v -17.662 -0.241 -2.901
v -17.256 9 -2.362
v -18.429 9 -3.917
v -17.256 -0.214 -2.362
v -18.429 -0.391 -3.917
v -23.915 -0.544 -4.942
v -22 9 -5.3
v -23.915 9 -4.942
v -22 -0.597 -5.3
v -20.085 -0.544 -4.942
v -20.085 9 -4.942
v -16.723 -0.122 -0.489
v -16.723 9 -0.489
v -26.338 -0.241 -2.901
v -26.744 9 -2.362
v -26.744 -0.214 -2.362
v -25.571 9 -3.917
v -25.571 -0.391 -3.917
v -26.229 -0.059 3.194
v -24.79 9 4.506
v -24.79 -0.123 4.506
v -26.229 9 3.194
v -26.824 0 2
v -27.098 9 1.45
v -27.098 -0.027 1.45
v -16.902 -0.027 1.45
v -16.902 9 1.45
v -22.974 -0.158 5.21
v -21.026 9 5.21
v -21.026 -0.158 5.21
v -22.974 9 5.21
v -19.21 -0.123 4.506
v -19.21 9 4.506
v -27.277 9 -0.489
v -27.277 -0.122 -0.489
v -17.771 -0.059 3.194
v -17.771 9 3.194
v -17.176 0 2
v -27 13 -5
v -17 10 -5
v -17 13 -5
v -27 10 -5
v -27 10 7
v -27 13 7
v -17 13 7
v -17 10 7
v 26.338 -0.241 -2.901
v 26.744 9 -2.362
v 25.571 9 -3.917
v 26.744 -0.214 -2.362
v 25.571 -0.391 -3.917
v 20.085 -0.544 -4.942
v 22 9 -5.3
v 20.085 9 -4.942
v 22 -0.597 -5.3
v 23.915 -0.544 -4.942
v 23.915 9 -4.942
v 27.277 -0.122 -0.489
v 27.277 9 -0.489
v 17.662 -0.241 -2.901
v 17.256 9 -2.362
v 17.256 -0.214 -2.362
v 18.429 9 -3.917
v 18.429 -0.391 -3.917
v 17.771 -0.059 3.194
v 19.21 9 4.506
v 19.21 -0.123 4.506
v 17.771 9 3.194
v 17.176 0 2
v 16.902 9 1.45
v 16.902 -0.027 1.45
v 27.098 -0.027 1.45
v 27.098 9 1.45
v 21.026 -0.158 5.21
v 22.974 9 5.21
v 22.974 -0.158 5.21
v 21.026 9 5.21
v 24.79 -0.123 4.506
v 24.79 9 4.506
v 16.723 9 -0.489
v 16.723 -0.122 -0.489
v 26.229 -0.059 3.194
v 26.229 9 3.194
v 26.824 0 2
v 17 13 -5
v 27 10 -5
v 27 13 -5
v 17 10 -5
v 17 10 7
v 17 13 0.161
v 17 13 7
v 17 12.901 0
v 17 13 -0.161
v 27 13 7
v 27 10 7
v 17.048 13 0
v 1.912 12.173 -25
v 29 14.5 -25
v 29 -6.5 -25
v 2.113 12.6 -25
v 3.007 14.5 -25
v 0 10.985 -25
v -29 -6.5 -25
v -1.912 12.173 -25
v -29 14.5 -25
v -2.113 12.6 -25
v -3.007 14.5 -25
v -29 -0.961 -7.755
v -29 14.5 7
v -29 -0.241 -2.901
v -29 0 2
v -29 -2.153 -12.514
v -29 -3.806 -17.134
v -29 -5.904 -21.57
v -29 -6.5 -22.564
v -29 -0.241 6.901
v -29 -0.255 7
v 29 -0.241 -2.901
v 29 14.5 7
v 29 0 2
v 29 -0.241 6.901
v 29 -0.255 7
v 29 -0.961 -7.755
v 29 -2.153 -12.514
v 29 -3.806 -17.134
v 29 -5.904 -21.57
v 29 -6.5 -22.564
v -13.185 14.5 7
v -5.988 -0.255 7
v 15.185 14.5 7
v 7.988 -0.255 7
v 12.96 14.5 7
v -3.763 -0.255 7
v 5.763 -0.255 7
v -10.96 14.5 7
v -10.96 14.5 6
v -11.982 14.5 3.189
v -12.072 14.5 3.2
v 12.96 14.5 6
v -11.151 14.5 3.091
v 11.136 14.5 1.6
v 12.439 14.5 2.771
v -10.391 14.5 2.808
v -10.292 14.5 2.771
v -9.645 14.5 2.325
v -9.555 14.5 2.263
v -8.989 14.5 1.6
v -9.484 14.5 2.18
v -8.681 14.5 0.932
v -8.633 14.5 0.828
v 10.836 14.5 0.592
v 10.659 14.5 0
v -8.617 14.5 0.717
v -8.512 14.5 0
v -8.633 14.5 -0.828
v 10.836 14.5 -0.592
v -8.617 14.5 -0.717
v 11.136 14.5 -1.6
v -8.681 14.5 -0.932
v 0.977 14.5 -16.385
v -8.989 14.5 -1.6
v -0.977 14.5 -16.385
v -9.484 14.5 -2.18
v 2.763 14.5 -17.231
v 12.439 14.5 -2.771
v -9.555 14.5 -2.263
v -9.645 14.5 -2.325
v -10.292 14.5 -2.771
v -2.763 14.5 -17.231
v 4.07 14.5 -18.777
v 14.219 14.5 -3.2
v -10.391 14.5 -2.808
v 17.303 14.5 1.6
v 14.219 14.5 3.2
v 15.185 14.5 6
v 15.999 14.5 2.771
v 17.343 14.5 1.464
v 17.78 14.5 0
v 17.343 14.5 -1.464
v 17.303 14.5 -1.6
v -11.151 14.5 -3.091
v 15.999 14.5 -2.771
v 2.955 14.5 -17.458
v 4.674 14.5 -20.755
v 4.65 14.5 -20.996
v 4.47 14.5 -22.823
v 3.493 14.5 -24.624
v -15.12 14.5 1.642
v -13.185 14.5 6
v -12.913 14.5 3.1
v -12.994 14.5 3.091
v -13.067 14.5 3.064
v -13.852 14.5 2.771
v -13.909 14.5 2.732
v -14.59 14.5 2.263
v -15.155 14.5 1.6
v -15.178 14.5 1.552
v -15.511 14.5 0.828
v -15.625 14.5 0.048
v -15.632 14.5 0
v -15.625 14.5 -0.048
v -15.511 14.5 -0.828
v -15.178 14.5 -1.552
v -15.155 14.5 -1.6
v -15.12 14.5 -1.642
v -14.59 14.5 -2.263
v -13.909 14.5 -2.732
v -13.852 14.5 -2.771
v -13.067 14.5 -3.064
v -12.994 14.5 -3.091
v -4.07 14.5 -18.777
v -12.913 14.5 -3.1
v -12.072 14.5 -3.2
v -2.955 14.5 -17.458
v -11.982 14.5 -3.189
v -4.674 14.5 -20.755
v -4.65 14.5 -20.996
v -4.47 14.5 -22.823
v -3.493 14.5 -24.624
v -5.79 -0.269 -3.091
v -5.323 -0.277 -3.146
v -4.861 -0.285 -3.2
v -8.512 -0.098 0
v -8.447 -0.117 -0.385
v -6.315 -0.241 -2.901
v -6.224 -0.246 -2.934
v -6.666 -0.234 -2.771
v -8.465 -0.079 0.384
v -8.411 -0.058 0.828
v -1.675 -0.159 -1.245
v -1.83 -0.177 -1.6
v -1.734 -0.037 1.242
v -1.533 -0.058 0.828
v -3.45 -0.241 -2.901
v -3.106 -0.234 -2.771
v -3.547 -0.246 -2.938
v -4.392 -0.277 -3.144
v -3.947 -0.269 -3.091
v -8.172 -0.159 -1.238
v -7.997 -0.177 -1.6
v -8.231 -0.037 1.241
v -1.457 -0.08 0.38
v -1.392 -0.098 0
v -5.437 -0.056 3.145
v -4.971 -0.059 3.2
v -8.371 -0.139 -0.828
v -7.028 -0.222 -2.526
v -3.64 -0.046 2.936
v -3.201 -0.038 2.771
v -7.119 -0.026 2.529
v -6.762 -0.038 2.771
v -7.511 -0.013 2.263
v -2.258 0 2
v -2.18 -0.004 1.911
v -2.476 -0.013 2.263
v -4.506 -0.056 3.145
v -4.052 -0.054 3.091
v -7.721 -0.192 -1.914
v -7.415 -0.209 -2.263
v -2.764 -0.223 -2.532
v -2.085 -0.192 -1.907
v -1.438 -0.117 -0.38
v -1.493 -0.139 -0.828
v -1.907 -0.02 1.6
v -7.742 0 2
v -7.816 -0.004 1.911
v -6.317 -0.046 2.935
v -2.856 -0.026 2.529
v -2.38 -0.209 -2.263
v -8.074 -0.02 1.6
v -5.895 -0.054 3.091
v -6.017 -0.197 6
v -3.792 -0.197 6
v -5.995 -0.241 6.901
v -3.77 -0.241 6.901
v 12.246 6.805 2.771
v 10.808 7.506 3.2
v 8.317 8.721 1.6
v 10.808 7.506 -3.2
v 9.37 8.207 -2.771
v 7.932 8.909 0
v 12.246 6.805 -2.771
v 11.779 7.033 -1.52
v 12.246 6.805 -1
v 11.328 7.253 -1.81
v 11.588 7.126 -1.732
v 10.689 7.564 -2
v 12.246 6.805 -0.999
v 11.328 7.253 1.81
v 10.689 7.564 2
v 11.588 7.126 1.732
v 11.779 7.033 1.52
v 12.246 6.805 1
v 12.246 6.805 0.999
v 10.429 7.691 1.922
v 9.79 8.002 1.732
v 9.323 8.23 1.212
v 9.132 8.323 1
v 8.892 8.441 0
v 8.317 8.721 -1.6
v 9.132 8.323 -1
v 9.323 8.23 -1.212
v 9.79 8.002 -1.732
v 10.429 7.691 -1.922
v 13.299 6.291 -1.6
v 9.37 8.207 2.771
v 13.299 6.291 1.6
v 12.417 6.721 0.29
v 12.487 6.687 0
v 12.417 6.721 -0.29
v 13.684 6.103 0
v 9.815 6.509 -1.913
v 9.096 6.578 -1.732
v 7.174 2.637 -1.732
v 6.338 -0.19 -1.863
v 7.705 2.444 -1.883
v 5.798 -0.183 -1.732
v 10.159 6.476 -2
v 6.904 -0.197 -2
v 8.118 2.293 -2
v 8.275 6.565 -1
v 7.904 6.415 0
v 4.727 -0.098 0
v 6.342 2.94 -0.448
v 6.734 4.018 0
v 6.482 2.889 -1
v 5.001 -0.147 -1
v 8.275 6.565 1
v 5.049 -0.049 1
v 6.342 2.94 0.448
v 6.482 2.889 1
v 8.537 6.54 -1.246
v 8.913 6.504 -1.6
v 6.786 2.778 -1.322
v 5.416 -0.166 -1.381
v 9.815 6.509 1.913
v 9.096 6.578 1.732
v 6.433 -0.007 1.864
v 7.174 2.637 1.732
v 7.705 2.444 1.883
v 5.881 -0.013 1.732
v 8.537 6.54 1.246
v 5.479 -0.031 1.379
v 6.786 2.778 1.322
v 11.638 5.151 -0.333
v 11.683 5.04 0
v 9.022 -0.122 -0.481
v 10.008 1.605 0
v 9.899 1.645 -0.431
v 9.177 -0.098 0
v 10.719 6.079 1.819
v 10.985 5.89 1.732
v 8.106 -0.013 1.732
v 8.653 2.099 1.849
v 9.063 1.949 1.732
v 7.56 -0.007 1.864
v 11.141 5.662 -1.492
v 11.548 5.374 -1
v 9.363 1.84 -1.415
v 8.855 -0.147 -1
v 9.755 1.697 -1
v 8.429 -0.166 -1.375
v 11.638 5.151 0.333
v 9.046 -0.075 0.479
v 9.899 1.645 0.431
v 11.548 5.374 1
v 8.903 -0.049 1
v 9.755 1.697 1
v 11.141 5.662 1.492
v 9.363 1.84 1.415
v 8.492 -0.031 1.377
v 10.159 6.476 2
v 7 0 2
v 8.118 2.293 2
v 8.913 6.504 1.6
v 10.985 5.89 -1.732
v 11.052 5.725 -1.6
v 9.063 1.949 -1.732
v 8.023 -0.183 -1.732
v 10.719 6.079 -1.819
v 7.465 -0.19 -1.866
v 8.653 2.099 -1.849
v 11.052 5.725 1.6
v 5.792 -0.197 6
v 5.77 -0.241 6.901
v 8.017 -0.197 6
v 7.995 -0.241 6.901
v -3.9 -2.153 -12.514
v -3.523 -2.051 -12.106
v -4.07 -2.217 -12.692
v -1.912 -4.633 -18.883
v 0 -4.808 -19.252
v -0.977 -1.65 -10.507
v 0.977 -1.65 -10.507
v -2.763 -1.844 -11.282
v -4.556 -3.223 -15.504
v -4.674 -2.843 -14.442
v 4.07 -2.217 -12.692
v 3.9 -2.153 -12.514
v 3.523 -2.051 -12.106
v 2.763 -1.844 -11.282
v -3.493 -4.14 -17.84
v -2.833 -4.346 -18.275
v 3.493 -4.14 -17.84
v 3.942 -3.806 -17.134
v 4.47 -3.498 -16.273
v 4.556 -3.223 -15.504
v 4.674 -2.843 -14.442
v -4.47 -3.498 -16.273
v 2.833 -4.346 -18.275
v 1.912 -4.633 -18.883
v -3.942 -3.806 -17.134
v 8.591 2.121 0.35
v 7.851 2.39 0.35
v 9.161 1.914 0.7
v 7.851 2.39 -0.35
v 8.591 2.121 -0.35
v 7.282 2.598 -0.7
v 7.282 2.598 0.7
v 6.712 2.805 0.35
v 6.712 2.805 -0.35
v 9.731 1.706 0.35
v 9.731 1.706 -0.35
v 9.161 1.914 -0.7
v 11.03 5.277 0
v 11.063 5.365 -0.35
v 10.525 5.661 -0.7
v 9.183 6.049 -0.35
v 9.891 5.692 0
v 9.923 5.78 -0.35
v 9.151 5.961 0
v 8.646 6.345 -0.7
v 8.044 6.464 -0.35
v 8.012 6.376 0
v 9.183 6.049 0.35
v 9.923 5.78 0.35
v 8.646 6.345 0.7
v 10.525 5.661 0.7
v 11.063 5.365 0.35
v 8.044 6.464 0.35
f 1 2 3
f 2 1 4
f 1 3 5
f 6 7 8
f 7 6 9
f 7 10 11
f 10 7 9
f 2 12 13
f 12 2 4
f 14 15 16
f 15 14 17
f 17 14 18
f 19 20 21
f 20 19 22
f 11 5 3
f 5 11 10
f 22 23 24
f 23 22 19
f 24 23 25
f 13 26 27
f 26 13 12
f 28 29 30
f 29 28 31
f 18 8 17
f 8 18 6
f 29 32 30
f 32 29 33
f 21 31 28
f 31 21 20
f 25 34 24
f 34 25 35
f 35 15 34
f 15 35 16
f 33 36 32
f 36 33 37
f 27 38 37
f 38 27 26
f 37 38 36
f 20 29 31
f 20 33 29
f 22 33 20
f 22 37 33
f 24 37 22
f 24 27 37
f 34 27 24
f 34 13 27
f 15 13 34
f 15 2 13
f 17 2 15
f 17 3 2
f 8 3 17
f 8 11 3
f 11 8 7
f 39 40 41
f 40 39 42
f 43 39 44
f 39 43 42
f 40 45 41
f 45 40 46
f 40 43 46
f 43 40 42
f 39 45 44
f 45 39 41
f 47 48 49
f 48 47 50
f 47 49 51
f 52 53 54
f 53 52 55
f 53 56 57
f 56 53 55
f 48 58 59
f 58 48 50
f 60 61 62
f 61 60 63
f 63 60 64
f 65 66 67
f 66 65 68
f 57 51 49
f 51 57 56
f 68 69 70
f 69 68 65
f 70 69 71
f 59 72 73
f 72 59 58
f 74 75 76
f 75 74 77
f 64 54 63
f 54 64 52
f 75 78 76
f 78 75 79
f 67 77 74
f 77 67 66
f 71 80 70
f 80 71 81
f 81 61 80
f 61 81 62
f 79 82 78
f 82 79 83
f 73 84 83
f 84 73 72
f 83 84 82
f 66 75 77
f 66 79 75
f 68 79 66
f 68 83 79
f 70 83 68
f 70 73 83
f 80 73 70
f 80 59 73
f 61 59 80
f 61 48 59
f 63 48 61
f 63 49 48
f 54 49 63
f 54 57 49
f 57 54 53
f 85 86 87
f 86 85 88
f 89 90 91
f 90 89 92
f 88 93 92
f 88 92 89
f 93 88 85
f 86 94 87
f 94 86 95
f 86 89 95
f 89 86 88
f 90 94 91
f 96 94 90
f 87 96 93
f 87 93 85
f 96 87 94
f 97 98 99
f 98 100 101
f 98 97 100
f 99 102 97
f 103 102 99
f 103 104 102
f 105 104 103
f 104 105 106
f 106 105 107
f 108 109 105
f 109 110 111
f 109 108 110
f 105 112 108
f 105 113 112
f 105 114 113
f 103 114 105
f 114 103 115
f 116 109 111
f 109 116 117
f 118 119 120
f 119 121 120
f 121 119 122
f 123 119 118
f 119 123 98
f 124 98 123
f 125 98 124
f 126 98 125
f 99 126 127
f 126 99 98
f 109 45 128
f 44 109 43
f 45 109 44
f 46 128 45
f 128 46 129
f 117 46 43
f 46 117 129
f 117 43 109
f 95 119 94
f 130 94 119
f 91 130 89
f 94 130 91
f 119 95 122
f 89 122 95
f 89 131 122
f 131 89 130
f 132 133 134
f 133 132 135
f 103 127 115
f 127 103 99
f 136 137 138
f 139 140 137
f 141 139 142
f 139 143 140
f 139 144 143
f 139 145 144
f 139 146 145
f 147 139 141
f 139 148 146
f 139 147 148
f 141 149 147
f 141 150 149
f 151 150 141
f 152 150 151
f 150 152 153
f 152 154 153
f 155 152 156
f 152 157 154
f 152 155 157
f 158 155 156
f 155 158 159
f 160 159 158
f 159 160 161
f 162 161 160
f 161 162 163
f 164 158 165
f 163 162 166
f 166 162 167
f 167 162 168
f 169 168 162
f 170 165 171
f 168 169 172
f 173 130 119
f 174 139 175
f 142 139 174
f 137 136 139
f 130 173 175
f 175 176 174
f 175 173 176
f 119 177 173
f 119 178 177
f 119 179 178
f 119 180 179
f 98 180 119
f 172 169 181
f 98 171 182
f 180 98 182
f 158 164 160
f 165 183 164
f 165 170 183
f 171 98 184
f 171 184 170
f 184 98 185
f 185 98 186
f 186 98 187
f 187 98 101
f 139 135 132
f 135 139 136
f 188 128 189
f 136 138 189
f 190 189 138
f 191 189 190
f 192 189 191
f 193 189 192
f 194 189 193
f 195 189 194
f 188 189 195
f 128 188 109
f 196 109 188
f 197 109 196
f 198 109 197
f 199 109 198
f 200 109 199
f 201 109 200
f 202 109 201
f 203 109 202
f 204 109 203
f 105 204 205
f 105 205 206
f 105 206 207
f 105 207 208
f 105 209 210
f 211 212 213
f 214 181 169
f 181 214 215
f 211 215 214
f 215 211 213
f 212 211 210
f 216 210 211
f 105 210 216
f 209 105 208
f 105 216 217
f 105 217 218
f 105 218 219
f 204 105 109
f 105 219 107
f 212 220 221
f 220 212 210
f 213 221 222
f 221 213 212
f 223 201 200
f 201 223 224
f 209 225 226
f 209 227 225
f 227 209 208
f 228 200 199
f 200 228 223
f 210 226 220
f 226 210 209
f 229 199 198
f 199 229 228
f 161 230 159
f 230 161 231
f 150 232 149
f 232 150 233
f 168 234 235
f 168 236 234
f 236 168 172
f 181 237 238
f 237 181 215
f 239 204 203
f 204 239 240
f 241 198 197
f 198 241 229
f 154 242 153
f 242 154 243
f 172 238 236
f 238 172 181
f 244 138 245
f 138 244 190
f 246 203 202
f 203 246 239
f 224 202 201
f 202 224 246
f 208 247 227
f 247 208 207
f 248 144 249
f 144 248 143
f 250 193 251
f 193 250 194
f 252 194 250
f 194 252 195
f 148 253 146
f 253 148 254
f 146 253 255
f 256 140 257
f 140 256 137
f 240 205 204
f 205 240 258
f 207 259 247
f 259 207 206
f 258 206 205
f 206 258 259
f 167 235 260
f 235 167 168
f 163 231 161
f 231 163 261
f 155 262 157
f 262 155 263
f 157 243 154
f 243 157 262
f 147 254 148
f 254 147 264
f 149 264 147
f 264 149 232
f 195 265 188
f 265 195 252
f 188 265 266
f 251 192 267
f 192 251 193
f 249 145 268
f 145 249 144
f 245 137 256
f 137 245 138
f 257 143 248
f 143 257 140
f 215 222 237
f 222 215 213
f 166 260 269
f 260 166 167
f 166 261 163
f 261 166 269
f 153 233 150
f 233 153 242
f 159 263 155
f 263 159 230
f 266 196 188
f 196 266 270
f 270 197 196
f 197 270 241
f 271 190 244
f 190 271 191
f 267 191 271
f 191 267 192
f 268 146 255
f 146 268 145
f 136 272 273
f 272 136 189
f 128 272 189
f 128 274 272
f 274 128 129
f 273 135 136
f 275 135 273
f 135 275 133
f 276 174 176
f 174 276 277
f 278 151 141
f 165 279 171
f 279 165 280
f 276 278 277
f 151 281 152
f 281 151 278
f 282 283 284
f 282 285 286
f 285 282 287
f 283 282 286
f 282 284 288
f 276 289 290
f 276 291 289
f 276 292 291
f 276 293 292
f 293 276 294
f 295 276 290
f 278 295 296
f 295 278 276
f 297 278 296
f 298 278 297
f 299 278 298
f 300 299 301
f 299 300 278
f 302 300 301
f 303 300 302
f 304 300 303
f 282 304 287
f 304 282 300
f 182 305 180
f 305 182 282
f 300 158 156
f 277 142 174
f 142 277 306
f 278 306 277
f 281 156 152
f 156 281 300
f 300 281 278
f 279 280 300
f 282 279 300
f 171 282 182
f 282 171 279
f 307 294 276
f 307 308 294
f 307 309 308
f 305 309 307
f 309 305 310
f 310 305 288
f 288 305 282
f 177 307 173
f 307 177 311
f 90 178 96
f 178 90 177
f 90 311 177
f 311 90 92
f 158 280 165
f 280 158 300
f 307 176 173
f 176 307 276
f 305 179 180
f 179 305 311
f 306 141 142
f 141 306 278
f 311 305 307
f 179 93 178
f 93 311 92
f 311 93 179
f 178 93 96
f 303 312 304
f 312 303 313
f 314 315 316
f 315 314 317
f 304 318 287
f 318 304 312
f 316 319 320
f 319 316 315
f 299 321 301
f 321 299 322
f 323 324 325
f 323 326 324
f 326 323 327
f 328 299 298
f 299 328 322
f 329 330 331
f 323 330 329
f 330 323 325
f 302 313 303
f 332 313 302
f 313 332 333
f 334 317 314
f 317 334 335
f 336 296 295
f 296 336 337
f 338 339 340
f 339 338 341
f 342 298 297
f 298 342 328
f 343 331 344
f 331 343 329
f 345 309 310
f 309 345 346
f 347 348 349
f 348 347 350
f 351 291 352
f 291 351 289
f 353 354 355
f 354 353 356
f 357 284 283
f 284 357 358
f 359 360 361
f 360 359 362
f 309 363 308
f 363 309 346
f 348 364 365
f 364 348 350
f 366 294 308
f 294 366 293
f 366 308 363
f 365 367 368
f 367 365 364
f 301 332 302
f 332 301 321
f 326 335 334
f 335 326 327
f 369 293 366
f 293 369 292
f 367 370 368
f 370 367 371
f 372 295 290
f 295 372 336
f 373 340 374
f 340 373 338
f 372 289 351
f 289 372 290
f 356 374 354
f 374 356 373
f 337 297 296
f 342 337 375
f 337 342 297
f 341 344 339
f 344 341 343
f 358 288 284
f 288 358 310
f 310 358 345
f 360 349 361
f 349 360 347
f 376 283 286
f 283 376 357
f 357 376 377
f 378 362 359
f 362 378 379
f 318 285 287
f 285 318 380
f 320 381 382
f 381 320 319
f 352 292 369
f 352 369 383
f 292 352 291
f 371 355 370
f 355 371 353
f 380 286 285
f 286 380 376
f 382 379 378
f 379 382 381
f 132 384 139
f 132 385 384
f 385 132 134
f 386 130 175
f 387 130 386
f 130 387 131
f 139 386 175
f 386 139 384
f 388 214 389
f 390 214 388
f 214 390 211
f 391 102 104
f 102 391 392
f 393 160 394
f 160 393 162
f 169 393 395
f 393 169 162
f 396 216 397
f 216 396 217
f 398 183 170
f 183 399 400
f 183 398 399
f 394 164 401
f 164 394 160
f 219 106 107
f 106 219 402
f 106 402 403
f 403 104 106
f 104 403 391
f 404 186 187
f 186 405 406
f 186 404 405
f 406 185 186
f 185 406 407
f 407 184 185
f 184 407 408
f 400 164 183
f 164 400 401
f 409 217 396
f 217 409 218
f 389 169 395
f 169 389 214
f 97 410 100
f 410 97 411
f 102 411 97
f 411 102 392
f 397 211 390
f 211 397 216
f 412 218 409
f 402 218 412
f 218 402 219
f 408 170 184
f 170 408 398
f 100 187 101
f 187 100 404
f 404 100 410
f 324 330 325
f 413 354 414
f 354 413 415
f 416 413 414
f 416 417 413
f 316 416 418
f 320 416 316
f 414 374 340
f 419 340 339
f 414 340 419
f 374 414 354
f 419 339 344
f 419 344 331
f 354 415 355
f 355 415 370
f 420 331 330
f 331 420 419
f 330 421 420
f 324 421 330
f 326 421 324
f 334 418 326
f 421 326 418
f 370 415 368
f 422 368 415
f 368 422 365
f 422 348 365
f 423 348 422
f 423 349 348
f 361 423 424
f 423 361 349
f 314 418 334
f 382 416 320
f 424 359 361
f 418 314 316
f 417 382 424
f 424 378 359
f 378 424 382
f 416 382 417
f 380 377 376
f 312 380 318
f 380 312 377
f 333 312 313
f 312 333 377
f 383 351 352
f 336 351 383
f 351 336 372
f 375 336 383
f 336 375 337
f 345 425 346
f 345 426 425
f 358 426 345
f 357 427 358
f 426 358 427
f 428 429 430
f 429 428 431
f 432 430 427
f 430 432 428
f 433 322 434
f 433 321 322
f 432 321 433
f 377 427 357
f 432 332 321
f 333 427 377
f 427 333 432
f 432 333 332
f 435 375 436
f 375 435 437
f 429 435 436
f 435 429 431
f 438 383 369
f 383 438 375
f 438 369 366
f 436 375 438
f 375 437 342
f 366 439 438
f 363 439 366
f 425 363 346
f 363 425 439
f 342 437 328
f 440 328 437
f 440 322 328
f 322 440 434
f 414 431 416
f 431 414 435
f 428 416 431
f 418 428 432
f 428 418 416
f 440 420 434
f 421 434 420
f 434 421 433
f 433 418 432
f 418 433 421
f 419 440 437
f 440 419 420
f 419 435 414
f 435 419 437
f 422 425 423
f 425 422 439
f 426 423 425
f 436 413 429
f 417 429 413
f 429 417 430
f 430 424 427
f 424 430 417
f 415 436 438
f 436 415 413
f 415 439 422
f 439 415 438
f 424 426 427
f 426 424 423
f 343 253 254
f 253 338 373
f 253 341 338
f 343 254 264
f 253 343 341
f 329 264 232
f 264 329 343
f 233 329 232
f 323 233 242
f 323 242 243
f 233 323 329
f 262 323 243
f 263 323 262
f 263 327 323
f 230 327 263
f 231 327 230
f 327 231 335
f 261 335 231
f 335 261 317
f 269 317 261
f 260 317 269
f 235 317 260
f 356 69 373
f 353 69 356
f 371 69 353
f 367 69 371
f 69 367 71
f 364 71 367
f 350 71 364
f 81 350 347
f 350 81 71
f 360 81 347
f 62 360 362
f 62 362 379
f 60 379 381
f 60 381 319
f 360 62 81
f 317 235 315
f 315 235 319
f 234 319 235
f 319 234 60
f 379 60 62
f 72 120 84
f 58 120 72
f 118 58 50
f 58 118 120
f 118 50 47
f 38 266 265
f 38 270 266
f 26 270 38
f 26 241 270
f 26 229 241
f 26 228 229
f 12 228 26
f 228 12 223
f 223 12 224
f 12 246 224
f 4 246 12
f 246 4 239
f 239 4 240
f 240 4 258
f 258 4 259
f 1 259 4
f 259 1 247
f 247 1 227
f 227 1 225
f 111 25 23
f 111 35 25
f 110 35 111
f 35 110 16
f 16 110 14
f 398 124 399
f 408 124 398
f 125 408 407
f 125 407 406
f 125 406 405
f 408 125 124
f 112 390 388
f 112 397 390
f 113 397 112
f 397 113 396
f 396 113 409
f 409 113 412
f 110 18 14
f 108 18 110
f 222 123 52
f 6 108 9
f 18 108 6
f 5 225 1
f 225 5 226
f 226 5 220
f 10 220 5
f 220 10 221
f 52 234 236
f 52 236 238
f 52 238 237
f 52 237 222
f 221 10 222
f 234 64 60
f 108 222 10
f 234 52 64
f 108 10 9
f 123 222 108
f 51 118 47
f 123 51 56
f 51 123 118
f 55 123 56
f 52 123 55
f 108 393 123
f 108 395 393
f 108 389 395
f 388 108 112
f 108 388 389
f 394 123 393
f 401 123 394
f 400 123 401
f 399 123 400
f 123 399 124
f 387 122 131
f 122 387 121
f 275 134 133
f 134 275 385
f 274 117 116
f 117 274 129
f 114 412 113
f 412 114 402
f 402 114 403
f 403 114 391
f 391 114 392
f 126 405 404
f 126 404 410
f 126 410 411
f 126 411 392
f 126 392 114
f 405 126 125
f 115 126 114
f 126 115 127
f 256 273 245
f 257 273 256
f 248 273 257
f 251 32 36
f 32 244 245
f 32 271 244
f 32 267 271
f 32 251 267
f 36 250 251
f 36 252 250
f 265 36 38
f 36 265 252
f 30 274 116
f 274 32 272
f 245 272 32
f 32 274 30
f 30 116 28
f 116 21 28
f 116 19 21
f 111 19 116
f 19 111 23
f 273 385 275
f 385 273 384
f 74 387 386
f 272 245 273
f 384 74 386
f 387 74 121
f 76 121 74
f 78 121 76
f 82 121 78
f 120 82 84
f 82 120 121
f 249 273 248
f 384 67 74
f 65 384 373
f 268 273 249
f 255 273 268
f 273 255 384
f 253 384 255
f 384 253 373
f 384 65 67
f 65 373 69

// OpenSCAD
diameter=10;
height=4;
number=3;
distance=5;
baseline=40; 


module maghole(diameter,height,number,back) {
		translate([0,height*(number-2)/2,0])
        rotate([90,0,0])
         cylinder(r=diameter/2,h=height*(2*number-1),center=true);
    if(back == 1) {
		translate([0,-height*2*(number+1)/2,0])
        rotate([90,0,0])
         cylinder(r=diameter/6,h=height*number,center=true);
    }
}

module smaghole(diameter,height,number,back) {
		translate([0,.15+height*(number-2)/2,0])
        rotate([90,0,0])
         cylinder(r=0.3+diameter/2,h=height*(2*number-1),center=true);
    if(back == 1) {
		translate([0,-7,0])
        rotate([90,0,0])
         cylinder(r=0.3+diameter/2,h=height,center=true);
    }
    translate([-9,-13,-5]) cube([4+diameter,3,diameter]);    
   // translate([-1,-15,0]) cube([3,3,10]);
}
module mirror(diameter,height,number,distance,baseline) {
width=diameter+4;
depth=distance+height*number+4;
length=baseline+diameter+8;
mirrorthick = 2.7;
   difference() {
     translate([0,-height,0])
	   cube([width,  // Small dimension
            depth, // Optical path dim
		      length],center=true);
      translate([0,0,2+baseline/2])
             maghole(diameter,height,number,0);
     translate([0,0,-(2+baseline/2)])
             maghole(diameter,height,number,0);
     translate([0,depth/4,0])
          cube([width+2,depth+2,length-2*width],center=true);
    rotate([7,0,0])
     translate([0,0.6-depth/3,0.75])
          cube([width+2,mirrorthick+0.6,length-(2*diameter+4)],center=true);
     }
}

module sensor(diameter,height,number,distance,baseline) {
width=diameter+4;
depth=distance+height*number+4;
length=baseline+diameter+8;
mirrorthick = 2.6;
extra=2*width+4;

   difference() {
     translate([2+width/2,-height,0])
	   cube([extra,  // Small dimension
            depth, // Optical path dim
		      length],center=true);
      translate([0,0,2+baseline/2])
             smaghole(diameter,height,number,1);
     translate([0,0,-(2+baseline/2)])
             smaghole(diameter,height,number,1);
//LASER
     translate([0,0,5])
        rotate([64,0,0])
             cylinder(r=3.2,h=40,center=true,$fn=24);
     translate([-11,0,5])
        rotate([64,0,0]) cube([10,2,40],center=true);
//PhotoTransistor
     translate([0,-12,-13])
        rotate([116,0,0])
             cylinder(r=3.2,h=10,center=true,$fn=12);
     translate([0,0,-7])
        rotate([116,0,0])
             cylinder(r=2,h=40,center=true,$fn=12);
     translate([-11,0,-7])
        rotate([116,0,0]) cube([10,2,40],center=true);
//TEMP SENSOR
     translate([2+width,0,0])
        rotate([90,0,20])
             cylinder(r=4.7,h=40,center=true);

     }
translate([0,-2,-6])
rotate([20,0,0])
     difference() {
     translate([0,-4,-2.5])cube([5,6,5],center=true);
     translate([0,-8,0])
        cylinder(r=3.2,h=10,center=true,$fn=12);
     translate([0,0,-1.0])
        rotate([90,0,0])
             cylinder(r=0.7,h=40,center=true,$fn=6);
     translate([0,0,-3])
        rotate([90,0,0])
             cylinder(r=0.7,h=40,center=true,$fn=6);
     }
}

module jarwall() {
  difference() {
     cube([40,40,120],center=true);
	  translate([40,0,0])
	     cylinder(r=50,h=120,center=true,$fn=64);
	   }
}

module jar() {
	  translate([-8,110,-10])
	          cylinder(r=50,h=120,center=true,$fn=64);
}

module powerhole(dim) {
offset = dim+2;
  //  cylinder(r=dim,h=2*dim,center=true,$fn=10);
  //  translate([dim-1.6,0,0])
   //   cylinder(r=dim,h=dim,center=true,$fn=10);
    translate([dim-3,0,0]) cube([2*dim+2,2*dim-1,2*dim-1],center=true);
    translate([-offset,0,0])
      cylinder(r=1.1,h=2*dim,center=true,$fn=10);
    translate([offset+2,0,0])
      cylinder(r=1.1,h=2*dim,center=true,$fn=10);
}

module sensordevice() {
  wall = 32;
  side = 44;
  deep = 50;
  difference() { 
   sensor(diameter,height,number,distance,baseline);
   translate([6,-60,3]) jar();
  }
//  translate([-7,-(wall+30),21]) cube([wall,side+12,3]);

//     translate([-7,-(wall+30),-24])
//         cube([wall,side+12,3]);

//  difference() {
//  translate([23.5,-(wall+7),0])
//    rotate([0,90,0])
//    cube([side,deep,3],center=true);
//     translate([24,-54,12])
//			rotate([0,90,0]) 
//           powerhole(4.5);
//  }
}
module mirrordevice() {
  difference() { 
   mirror(diameter,height,number,distance,baseline);
   translate([0,-3.3,0]) rotate([0,0,-90]) jarwall();
  }
}

rotate([0,90,180]) 
   sensordevice();
  // mirrordevice();



     
